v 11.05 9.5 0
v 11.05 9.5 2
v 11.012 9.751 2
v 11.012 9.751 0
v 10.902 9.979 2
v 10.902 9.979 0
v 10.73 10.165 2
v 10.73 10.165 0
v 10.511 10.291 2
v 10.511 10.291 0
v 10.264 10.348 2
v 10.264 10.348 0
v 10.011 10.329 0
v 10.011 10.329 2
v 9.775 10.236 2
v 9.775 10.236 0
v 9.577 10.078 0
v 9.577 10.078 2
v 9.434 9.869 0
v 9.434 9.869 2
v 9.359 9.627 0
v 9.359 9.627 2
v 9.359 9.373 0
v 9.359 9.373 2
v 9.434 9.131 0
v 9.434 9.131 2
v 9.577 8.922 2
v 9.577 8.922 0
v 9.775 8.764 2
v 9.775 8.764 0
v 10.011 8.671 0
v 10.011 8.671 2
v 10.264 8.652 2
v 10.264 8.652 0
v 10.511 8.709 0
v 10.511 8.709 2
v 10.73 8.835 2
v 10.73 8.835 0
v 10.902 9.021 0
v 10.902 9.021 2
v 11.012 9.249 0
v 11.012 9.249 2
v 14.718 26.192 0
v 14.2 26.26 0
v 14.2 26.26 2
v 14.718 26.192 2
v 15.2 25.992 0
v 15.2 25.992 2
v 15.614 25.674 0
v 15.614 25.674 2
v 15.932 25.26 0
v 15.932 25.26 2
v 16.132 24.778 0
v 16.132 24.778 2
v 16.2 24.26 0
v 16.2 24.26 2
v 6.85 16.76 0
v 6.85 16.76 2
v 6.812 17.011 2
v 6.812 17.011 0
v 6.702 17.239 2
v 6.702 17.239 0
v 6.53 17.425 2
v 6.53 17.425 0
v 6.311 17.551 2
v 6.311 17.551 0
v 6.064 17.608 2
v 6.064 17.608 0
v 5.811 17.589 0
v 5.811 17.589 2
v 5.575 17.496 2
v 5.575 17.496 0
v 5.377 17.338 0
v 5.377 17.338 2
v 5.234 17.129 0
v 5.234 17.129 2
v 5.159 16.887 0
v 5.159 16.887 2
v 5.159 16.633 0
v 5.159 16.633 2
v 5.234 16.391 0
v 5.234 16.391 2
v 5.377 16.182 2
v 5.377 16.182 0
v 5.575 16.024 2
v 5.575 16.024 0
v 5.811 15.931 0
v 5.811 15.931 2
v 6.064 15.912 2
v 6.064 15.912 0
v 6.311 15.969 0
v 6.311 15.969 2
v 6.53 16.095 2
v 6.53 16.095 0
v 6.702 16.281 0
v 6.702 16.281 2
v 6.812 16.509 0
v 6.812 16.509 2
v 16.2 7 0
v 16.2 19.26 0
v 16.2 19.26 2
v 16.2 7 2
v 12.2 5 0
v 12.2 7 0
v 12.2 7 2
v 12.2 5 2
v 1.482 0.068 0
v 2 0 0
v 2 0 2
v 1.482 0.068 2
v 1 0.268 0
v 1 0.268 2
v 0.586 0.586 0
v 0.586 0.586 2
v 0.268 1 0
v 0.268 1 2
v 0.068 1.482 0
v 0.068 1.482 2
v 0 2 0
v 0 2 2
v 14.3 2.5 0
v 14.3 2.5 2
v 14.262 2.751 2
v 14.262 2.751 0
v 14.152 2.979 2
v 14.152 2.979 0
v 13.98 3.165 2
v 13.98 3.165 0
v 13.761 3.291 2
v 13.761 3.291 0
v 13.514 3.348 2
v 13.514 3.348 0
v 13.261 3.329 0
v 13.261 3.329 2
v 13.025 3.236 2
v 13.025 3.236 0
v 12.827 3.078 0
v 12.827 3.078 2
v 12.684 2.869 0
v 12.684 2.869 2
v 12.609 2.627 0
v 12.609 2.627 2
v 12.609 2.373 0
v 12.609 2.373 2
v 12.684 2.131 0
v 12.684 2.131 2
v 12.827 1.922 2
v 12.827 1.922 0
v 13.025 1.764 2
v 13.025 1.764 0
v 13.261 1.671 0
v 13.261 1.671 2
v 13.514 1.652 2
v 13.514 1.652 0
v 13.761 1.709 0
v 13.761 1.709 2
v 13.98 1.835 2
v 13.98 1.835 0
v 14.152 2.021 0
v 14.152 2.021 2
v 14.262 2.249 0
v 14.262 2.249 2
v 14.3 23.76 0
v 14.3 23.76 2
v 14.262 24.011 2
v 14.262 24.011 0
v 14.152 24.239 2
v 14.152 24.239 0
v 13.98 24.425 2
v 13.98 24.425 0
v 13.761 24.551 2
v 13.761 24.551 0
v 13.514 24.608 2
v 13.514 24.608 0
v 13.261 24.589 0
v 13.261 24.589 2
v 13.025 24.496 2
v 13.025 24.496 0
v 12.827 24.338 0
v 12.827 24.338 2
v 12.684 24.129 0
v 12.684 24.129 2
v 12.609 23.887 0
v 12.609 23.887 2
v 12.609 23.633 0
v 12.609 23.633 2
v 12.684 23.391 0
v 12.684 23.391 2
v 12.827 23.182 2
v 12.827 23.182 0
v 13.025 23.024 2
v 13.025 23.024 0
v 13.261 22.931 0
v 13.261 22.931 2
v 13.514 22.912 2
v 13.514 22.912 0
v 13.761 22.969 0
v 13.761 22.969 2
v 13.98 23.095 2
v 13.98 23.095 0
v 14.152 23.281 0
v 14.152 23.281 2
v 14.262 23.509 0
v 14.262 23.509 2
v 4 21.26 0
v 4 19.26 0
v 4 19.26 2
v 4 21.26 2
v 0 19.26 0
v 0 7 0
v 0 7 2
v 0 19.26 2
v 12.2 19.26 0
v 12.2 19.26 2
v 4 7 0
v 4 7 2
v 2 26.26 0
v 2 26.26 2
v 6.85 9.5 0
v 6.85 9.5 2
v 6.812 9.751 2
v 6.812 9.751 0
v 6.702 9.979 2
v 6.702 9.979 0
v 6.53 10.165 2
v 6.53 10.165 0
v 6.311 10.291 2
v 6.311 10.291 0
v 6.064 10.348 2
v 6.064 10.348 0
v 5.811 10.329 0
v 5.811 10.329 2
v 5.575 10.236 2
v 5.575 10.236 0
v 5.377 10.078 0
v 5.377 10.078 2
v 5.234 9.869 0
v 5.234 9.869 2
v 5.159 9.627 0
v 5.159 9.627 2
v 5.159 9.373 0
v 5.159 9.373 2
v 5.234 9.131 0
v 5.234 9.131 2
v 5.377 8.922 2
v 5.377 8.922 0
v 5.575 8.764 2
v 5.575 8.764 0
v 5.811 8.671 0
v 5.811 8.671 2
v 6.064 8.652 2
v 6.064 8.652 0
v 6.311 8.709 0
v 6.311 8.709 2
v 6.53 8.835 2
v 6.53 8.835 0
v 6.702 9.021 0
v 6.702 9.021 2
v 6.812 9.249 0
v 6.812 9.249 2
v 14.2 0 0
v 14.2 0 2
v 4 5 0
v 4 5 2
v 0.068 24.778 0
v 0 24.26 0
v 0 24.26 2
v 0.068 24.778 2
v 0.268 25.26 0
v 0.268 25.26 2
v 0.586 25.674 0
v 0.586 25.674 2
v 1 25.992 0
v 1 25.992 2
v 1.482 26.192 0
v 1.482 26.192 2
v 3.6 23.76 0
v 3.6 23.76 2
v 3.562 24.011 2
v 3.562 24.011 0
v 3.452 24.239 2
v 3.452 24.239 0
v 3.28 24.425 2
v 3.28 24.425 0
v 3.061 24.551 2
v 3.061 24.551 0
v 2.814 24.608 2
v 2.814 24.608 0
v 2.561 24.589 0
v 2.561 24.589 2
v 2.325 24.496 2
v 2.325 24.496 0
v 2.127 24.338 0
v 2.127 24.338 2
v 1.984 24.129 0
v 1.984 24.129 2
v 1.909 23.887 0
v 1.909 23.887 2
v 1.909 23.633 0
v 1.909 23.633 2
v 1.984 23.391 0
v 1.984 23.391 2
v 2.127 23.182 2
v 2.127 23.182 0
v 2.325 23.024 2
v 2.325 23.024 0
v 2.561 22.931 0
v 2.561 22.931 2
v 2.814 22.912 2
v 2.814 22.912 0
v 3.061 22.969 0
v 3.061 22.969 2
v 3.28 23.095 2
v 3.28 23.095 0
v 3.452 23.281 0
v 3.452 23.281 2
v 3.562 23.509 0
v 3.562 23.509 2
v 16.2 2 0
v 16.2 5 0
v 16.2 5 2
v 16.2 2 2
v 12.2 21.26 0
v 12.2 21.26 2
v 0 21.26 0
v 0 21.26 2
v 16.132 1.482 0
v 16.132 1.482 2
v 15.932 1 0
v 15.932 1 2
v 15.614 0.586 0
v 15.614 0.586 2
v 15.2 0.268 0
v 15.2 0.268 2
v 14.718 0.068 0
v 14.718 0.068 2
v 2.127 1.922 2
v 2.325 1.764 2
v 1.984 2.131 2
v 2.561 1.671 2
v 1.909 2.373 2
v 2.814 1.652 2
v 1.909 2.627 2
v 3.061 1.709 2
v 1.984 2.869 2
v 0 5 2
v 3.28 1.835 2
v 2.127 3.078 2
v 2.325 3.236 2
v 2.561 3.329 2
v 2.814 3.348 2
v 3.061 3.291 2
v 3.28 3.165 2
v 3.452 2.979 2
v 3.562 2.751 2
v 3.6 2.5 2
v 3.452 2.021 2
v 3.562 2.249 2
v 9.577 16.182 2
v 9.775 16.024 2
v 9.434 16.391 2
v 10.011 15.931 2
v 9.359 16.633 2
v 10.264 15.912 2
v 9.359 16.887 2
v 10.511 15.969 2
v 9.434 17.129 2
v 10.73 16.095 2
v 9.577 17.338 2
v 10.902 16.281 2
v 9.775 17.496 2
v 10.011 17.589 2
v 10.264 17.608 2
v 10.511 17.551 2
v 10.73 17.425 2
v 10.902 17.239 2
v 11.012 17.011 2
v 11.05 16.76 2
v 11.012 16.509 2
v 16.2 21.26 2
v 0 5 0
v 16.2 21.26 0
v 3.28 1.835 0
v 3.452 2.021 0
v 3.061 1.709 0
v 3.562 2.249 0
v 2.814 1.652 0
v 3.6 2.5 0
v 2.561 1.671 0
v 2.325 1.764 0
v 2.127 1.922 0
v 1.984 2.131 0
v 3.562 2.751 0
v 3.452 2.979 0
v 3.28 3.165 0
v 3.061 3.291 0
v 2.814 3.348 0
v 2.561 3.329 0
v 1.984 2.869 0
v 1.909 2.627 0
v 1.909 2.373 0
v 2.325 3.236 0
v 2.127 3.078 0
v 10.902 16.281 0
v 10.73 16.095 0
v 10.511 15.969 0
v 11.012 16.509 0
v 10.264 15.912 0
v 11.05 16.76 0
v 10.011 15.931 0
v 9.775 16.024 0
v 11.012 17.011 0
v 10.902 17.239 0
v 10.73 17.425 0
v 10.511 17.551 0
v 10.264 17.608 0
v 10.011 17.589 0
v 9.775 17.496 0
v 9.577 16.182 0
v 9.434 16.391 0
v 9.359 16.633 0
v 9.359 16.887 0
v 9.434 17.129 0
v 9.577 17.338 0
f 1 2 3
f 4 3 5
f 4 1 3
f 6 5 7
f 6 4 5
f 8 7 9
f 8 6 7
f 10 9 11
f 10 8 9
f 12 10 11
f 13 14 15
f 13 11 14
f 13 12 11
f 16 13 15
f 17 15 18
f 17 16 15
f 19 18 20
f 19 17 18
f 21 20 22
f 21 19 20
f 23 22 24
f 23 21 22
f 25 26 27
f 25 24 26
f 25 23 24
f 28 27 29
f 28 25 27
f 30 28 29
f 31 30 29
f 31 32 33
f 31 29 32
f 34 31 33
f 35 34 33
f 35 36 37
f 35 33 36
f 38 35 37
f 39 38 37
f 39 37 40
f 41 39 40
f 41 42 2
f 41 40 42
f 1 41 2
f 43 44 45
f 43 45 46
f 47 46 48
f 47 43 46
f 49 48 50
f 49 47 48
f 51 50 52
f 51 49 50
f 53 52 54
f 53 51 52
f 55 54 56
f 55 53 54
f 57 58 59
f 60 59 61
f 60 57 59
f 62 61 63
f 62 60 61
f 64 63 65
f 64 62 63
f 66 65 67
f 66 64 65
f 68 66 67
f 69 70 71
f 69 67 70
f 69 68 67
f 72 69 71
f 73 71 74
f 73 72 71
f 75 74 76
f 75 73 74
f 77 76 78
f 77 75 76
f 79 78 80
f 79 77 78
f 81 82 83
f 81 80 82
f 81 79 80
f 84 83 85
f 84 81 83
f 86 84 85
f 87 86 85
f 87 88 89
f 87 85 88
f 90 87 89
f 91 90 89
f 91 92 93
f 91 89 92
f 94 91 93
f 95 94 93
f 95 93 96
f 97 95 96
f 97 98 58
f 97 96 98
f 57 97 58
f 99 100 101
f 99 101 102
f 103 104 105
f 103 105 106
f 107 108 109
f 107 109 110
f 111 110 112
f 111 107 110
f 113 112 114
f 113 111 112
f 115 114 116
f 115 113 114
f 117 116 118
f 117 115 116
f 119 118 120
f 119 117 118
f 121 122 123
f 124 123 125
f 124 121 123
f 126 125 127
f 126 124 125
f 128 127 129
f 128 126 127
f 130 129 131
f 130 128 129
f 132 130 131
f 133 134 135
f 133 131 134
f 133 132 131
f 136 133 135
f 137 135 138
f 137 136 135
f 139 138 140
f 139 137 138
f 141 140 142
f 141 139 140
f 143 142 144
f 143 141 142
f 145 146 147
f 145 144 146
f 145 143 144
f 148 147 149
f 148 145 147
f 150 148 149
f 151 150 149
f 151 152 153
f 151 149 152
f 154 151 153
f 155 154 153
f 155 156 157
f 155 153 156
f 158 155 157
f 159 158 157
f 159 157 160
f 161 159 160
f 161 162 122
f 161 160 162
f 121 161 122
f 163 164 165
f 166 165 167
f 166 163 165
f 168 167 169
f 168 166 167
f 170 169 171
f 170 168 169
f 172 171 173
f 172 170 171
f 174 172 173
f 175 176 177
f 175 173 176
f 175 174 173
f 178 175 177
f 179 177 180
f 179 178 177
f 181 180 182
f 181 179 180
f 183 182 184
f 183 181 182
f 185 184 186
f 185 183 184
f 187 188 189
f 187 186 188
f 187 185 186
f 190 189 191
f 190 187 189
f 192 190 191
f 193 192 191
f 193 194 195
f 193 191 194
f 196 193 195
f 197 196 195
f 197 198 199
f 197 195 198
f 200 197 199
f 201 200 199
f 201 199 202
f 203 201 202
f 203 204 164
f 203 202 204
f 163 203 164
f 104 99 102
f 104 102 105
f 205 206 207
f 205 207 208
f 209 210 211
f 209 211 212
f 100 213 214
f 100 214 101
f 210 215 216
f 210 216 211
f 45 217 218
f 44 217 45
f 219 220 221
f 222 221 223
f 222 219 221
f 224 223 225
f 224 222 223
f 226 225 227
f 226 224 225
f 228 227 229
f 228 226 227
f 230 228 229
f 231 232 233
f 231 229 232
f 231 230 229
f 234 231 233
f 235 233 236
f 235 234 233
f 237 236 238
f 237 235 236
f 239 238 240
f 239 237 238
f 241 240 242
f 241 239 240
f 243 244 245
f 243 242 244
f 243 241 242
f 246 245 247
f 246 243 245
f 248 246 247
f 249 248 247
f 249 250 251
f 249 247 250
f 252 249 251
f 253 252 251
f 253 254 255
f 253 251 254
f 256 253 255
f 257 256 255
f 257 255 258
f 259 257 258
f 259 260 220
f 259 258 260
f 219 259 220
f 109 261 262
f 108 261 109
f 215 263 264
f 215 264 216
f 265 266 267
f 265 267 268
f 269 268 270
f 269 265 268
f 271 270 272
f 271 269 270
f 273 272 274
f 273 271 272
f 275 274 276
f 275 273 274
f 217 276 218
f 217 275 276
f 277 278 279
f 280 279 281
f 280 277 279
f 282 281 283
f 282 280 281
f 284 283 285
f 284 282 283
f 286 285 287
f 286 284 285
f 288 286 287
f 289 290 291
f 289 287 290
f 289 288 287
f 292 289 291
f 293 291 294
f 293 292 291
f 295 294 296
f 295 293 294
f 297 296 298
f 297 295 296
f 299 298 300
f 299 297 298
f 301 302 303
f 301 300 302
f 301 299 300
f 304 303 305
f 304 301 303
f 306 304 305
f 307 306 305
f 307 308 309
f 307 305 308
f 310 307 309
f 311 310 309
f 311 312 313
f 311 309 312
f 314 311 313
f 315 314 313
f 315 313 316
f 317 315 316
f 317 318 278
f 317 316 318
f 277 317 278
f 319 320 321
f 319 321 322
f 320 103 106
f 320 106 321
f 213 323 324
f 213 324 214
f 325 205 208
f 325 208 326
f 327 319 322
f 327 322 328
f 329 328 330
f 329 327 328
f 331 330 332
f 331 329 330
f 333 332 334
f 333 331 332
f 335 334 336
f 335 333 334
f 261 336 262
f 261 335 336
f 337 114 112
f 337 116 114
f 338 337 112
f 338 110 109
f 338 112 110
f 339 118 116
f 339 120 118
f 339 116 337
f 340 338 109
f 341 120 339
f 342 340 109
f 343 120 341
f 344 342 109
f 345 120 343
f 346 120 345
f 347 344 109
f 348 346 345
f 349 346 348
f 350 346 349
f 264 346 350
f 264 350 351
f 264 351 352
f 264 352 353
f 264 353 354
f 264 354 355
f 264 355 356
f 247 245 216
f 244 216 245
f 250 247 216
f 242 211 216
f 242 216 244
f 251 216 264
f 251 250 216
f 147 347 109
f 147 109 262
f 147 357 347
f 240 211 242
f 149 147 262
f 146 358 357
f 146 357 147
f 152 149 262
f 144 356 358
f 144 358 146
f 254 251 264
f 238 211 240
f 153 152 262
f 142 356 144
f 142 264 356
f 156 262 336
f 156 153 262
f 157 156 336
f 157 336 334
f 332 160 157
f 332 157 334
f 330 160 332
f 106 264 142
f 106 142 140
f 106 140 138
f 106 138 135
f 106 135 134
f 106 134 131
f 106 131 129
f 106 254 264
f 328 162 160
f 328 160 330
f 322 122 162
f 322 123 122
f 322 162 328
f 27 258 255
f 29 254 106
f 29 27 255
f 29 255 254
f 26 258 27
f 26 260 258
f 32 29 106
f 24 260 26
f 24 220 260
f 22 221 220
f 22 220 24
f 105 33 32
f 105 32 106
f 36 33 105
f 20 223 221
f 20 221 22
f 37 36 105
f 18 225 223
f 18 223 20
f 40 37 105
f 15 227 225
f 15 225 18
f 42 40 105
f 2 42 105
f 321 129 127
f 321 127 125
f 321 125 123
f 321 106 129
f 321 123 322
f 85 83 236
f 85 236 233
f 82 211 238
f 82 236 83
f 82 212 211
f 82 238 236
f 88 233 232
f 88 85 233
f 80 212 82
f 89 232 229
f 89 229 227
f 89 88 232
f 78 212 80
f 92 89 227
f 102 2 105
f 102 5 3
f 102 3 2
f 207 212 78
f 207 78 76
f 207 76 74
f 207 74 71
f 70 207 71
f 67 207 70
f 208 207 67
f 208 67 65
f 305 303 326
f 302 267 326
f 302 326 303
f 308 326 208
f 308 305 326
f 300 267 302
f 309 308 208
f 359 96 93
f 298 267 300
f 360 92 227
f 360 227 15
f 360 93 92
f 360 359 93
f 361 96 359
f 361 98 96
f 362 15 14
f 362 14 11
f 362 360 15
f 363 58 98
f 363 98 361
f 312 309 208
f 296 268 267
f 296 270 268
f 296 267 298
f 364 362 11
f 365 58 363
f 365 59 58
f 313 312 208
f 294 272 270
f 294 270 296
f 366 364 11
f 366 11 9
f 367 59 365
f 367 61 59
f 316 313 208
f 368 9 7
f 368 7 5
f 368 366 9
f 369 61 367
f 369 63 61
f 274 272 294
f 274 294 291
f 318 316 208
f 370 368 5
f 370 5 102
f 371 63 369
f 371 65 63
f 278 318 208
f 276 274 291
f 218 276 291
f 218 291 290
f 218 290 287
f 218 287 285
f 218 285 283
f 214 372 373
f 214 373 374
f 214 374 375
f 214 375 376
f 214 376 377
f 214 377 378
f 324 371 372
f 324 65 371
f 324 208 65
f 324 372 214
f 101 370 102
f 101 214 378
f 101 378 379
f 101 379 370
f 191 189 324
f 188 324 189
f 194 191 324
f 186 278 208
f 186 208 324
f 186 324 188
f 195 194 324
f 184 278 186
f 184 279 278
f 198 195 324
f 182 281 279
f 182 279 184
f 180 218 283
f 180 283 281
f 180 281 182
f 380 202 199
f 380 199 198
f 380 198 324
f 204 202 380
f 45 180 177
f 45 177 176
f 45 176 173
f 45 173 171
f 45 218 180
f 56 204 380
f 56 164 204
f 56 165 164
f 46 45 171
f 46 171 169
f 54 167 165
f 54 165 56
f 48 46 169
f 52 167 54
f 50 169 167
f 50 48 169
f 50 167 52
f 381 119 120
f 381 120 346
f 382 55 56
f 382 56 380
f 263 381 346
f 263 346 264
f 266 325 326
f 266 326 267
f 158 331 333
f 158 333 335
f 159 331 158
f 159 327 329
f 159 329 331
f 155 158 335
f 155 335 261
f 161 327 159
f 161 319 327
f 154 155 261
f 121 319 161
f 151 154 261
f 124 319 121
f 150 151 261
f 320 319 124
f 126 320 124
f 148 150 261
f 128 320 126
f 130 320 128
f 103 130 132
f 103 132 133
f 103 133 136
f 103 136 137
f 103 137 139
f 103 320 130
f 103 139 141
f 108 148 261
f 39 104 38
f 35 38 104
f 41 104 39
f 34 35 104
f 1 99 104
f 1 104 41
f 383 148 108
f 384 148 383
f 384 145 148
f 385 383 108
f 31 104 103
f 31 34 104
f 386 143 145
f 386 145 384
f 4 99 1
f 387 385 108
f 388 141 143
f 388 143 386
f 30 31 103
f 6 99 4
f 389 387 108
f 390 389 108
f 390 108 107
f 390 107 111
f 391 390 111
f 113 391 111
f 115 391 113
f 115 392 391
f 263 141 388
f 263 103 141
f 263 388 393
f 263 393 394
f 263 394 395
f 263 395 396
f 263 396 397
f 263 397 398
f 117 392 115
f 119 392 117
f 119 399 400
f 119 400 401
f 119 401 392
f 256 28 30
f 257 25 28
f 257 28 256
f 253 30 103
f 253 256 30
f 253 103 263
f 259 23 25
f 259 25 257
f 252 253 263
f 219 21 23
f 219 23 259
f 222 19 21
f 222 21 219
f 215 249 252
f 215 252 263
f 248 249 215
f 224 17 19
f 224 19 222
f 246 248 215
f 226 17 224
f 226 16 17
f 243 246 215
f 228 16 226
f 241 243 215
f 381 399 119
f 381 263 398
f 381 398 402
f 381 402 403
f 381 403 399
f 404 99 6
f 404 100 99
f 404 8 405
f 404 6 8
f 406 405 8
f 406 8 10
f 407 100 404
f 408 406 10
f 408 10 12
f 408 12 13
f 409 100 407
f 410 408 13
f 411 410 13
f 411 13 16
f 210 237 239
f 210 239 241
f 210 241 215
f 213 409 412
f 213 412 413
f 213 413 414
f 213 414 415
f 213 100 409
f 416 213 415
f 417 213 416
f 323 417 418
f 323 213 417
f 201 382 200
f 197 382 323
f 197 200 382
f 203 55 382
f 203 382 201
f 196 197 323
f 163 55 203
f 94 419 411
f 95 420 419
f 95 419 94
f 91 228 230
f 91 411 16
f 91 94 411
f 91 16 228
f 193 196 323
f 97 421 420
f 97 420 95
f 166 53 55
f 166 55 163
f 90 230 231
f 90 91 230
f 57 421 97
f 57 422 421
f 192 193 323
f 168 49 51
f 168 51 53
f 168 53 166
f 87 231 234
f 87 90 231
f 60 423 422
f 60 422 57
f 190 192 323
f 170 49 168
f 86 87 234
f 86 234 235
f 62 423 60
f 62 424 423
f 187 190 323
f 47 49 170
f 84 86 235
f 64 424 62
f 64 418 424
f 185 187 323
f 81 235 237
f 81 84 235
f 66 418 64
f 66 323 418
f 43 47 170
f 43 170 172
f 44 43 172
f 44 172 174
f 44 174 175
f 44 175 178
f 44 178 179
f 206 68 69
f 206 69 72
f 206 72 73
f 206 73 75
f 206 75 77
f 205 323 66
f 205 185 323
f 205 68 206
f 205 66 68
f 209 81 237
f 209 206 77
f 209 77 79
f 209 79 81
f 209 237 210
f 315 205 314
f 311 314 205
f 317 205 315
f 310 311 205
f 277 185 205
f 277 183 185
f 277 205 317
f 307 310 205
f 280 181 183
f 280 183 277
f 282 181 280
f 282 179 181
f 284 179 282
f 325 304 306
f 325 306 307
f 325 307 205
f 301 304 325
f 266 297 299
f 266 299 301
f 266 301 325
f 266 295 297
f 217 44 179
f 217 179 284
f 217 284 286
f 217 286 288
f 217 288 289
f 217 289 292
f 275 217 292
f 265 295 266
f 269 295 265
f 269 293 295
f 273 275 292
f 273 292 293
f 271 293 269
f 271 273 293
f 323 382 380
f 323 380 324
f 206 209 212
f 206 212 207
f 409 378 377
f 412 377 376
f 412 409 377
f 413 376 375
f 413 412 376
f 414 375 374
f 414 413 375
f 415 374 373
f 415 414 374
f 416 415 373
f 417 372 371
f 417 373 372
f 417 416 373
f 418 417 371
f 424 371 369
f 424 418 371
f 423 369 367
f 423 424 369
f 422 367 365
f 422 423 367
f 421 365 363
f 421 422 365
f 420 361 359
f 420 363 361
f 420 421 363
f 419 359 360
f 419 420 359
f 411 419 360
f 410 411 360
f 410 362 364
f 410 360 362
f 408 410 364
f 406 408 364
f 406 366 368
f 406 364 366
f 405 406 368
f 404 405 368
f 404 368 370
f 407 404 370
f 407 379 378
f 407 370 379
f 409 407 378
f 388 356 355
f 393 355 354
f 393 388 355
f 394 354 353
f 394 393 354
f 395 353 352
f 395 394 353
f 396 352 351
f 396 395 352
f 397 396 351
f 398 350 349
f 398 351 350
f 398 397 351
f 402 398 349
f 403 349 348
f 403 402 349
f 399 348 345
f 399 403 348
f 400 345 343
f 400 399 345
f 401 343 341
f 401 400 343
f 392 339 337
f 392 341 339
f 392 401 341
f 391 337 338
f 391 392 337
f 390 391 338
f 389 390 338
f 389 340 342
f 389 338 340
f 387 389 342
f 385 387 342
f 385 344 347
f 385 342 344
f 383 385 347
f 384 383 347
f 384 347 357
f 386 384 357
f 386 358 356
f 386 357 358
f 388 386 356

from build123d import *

# Parameters (mm, degrees)
SKETCH2_R           = 0.85
BOSS_EXTRUDE1_DEPTH = 4
SKETCH3_W           = 16.2
SKETCH3_H           = 26.26
CUT_EXTRUDE1_DEPTH  = 2


with BuildPart() as part:
    # Sketch2 → Boss-Extrude1 (new body)
    with BuildSketch(Plane.XY):
        with BuildLine():
            Line((0, 7), (0, 19.26))
            Line((0, 19.26), (4, 19.26))
            Line((4, 19.26), (4, 21.26))
            Line((4, 21.26), (0, 21.26))
            Line((0, 21.26), (0, 24.26))
            ThreePointArc((0, 24.26), (0.585786438, 25.674213562), (2, 26.26))
            Line((2, 26.26), (14.2, 26.26))
            ThreePointArc((14.2, 26.26), (15.614213562, 25.674213562), (16.2, 24.26))
            Line((16.2, 24.26), (16.2, 21.26))
            Line((16.2, 21.26), (12.2, 21.26))
            Line((12.2, 21.26), (12.2, 19.26))
            Line((12.2, 19.26), (16.2, 19.26))
            Line((16.2, 19.26), (16.2, 7))
            Line((16.2, 7), (12.2, 7))
            Line((12.2, 7), (12.2, 5))
            Line((12.2, 5), (16.2, 5))
            Line((16.2, 5), (16.2, 2))
            ThreePointArc((16.2, 2), (15.614213562, 0.585786438), (14.2, 0))
            Line((14.2, 0), (2, 0))
            ThreePointArc((2, 0), (0.585786438, 0.585786438), (0, 2))
            Line((0, 2), (0, 5))
            Line((0, 5), (4, 5))
            Line((4, 5), (4, 7))
            Line((4, 7), (0, 7))
        make_face()
        with Locations((13.45, 2.5)):
            Circle(SKETCH2_R, mode=Mode.SUBTRACT)
        with Locations((10.2, 9.5)):
            Circle(SKETCH2_R, mode=Mode.SUBTRACT)
        with Locations((2.75, 23.76)):
            Circle(SKETCH2_R, mode=Mode.SUBTRACT)
        with Locations((6, 16.76)):
            Circle(SKETCH2_R, mode=Mode.SUBTRACT)
        with Locations((10.2, 16.76)):
            Circle(SKETCH2_R, mode=Mode.SUBTRACT)
        with Locations((13.45, 23.76)):
            Circle(SKETCH2_R, mode=Mode.SUBTRACT)
        with Locations((6, 9.5)):
            Circle(SKETCH2_R, mode=Mode.SUBTRACT)
        with Locations((2.75, 2.5)):
            Circle(SKETCH2_R, mode=Mode.SUBTRACT)
    extrude(amount=BOSS_EXTRUDE1_DEPTH)

    # Sketch3 → Cut-Extrude1 (cut)
    with BuildSketch(Plane.XY.offset(4)):
        with Locations((8.1, 13.13)):
            Rectangle(SKETCH3_W, SKETCH3_H)
    extrude(amount=-CUT_EXTRUDE1_DEPTH, mode=Mode.SUBTRACT)


solid = part.part
